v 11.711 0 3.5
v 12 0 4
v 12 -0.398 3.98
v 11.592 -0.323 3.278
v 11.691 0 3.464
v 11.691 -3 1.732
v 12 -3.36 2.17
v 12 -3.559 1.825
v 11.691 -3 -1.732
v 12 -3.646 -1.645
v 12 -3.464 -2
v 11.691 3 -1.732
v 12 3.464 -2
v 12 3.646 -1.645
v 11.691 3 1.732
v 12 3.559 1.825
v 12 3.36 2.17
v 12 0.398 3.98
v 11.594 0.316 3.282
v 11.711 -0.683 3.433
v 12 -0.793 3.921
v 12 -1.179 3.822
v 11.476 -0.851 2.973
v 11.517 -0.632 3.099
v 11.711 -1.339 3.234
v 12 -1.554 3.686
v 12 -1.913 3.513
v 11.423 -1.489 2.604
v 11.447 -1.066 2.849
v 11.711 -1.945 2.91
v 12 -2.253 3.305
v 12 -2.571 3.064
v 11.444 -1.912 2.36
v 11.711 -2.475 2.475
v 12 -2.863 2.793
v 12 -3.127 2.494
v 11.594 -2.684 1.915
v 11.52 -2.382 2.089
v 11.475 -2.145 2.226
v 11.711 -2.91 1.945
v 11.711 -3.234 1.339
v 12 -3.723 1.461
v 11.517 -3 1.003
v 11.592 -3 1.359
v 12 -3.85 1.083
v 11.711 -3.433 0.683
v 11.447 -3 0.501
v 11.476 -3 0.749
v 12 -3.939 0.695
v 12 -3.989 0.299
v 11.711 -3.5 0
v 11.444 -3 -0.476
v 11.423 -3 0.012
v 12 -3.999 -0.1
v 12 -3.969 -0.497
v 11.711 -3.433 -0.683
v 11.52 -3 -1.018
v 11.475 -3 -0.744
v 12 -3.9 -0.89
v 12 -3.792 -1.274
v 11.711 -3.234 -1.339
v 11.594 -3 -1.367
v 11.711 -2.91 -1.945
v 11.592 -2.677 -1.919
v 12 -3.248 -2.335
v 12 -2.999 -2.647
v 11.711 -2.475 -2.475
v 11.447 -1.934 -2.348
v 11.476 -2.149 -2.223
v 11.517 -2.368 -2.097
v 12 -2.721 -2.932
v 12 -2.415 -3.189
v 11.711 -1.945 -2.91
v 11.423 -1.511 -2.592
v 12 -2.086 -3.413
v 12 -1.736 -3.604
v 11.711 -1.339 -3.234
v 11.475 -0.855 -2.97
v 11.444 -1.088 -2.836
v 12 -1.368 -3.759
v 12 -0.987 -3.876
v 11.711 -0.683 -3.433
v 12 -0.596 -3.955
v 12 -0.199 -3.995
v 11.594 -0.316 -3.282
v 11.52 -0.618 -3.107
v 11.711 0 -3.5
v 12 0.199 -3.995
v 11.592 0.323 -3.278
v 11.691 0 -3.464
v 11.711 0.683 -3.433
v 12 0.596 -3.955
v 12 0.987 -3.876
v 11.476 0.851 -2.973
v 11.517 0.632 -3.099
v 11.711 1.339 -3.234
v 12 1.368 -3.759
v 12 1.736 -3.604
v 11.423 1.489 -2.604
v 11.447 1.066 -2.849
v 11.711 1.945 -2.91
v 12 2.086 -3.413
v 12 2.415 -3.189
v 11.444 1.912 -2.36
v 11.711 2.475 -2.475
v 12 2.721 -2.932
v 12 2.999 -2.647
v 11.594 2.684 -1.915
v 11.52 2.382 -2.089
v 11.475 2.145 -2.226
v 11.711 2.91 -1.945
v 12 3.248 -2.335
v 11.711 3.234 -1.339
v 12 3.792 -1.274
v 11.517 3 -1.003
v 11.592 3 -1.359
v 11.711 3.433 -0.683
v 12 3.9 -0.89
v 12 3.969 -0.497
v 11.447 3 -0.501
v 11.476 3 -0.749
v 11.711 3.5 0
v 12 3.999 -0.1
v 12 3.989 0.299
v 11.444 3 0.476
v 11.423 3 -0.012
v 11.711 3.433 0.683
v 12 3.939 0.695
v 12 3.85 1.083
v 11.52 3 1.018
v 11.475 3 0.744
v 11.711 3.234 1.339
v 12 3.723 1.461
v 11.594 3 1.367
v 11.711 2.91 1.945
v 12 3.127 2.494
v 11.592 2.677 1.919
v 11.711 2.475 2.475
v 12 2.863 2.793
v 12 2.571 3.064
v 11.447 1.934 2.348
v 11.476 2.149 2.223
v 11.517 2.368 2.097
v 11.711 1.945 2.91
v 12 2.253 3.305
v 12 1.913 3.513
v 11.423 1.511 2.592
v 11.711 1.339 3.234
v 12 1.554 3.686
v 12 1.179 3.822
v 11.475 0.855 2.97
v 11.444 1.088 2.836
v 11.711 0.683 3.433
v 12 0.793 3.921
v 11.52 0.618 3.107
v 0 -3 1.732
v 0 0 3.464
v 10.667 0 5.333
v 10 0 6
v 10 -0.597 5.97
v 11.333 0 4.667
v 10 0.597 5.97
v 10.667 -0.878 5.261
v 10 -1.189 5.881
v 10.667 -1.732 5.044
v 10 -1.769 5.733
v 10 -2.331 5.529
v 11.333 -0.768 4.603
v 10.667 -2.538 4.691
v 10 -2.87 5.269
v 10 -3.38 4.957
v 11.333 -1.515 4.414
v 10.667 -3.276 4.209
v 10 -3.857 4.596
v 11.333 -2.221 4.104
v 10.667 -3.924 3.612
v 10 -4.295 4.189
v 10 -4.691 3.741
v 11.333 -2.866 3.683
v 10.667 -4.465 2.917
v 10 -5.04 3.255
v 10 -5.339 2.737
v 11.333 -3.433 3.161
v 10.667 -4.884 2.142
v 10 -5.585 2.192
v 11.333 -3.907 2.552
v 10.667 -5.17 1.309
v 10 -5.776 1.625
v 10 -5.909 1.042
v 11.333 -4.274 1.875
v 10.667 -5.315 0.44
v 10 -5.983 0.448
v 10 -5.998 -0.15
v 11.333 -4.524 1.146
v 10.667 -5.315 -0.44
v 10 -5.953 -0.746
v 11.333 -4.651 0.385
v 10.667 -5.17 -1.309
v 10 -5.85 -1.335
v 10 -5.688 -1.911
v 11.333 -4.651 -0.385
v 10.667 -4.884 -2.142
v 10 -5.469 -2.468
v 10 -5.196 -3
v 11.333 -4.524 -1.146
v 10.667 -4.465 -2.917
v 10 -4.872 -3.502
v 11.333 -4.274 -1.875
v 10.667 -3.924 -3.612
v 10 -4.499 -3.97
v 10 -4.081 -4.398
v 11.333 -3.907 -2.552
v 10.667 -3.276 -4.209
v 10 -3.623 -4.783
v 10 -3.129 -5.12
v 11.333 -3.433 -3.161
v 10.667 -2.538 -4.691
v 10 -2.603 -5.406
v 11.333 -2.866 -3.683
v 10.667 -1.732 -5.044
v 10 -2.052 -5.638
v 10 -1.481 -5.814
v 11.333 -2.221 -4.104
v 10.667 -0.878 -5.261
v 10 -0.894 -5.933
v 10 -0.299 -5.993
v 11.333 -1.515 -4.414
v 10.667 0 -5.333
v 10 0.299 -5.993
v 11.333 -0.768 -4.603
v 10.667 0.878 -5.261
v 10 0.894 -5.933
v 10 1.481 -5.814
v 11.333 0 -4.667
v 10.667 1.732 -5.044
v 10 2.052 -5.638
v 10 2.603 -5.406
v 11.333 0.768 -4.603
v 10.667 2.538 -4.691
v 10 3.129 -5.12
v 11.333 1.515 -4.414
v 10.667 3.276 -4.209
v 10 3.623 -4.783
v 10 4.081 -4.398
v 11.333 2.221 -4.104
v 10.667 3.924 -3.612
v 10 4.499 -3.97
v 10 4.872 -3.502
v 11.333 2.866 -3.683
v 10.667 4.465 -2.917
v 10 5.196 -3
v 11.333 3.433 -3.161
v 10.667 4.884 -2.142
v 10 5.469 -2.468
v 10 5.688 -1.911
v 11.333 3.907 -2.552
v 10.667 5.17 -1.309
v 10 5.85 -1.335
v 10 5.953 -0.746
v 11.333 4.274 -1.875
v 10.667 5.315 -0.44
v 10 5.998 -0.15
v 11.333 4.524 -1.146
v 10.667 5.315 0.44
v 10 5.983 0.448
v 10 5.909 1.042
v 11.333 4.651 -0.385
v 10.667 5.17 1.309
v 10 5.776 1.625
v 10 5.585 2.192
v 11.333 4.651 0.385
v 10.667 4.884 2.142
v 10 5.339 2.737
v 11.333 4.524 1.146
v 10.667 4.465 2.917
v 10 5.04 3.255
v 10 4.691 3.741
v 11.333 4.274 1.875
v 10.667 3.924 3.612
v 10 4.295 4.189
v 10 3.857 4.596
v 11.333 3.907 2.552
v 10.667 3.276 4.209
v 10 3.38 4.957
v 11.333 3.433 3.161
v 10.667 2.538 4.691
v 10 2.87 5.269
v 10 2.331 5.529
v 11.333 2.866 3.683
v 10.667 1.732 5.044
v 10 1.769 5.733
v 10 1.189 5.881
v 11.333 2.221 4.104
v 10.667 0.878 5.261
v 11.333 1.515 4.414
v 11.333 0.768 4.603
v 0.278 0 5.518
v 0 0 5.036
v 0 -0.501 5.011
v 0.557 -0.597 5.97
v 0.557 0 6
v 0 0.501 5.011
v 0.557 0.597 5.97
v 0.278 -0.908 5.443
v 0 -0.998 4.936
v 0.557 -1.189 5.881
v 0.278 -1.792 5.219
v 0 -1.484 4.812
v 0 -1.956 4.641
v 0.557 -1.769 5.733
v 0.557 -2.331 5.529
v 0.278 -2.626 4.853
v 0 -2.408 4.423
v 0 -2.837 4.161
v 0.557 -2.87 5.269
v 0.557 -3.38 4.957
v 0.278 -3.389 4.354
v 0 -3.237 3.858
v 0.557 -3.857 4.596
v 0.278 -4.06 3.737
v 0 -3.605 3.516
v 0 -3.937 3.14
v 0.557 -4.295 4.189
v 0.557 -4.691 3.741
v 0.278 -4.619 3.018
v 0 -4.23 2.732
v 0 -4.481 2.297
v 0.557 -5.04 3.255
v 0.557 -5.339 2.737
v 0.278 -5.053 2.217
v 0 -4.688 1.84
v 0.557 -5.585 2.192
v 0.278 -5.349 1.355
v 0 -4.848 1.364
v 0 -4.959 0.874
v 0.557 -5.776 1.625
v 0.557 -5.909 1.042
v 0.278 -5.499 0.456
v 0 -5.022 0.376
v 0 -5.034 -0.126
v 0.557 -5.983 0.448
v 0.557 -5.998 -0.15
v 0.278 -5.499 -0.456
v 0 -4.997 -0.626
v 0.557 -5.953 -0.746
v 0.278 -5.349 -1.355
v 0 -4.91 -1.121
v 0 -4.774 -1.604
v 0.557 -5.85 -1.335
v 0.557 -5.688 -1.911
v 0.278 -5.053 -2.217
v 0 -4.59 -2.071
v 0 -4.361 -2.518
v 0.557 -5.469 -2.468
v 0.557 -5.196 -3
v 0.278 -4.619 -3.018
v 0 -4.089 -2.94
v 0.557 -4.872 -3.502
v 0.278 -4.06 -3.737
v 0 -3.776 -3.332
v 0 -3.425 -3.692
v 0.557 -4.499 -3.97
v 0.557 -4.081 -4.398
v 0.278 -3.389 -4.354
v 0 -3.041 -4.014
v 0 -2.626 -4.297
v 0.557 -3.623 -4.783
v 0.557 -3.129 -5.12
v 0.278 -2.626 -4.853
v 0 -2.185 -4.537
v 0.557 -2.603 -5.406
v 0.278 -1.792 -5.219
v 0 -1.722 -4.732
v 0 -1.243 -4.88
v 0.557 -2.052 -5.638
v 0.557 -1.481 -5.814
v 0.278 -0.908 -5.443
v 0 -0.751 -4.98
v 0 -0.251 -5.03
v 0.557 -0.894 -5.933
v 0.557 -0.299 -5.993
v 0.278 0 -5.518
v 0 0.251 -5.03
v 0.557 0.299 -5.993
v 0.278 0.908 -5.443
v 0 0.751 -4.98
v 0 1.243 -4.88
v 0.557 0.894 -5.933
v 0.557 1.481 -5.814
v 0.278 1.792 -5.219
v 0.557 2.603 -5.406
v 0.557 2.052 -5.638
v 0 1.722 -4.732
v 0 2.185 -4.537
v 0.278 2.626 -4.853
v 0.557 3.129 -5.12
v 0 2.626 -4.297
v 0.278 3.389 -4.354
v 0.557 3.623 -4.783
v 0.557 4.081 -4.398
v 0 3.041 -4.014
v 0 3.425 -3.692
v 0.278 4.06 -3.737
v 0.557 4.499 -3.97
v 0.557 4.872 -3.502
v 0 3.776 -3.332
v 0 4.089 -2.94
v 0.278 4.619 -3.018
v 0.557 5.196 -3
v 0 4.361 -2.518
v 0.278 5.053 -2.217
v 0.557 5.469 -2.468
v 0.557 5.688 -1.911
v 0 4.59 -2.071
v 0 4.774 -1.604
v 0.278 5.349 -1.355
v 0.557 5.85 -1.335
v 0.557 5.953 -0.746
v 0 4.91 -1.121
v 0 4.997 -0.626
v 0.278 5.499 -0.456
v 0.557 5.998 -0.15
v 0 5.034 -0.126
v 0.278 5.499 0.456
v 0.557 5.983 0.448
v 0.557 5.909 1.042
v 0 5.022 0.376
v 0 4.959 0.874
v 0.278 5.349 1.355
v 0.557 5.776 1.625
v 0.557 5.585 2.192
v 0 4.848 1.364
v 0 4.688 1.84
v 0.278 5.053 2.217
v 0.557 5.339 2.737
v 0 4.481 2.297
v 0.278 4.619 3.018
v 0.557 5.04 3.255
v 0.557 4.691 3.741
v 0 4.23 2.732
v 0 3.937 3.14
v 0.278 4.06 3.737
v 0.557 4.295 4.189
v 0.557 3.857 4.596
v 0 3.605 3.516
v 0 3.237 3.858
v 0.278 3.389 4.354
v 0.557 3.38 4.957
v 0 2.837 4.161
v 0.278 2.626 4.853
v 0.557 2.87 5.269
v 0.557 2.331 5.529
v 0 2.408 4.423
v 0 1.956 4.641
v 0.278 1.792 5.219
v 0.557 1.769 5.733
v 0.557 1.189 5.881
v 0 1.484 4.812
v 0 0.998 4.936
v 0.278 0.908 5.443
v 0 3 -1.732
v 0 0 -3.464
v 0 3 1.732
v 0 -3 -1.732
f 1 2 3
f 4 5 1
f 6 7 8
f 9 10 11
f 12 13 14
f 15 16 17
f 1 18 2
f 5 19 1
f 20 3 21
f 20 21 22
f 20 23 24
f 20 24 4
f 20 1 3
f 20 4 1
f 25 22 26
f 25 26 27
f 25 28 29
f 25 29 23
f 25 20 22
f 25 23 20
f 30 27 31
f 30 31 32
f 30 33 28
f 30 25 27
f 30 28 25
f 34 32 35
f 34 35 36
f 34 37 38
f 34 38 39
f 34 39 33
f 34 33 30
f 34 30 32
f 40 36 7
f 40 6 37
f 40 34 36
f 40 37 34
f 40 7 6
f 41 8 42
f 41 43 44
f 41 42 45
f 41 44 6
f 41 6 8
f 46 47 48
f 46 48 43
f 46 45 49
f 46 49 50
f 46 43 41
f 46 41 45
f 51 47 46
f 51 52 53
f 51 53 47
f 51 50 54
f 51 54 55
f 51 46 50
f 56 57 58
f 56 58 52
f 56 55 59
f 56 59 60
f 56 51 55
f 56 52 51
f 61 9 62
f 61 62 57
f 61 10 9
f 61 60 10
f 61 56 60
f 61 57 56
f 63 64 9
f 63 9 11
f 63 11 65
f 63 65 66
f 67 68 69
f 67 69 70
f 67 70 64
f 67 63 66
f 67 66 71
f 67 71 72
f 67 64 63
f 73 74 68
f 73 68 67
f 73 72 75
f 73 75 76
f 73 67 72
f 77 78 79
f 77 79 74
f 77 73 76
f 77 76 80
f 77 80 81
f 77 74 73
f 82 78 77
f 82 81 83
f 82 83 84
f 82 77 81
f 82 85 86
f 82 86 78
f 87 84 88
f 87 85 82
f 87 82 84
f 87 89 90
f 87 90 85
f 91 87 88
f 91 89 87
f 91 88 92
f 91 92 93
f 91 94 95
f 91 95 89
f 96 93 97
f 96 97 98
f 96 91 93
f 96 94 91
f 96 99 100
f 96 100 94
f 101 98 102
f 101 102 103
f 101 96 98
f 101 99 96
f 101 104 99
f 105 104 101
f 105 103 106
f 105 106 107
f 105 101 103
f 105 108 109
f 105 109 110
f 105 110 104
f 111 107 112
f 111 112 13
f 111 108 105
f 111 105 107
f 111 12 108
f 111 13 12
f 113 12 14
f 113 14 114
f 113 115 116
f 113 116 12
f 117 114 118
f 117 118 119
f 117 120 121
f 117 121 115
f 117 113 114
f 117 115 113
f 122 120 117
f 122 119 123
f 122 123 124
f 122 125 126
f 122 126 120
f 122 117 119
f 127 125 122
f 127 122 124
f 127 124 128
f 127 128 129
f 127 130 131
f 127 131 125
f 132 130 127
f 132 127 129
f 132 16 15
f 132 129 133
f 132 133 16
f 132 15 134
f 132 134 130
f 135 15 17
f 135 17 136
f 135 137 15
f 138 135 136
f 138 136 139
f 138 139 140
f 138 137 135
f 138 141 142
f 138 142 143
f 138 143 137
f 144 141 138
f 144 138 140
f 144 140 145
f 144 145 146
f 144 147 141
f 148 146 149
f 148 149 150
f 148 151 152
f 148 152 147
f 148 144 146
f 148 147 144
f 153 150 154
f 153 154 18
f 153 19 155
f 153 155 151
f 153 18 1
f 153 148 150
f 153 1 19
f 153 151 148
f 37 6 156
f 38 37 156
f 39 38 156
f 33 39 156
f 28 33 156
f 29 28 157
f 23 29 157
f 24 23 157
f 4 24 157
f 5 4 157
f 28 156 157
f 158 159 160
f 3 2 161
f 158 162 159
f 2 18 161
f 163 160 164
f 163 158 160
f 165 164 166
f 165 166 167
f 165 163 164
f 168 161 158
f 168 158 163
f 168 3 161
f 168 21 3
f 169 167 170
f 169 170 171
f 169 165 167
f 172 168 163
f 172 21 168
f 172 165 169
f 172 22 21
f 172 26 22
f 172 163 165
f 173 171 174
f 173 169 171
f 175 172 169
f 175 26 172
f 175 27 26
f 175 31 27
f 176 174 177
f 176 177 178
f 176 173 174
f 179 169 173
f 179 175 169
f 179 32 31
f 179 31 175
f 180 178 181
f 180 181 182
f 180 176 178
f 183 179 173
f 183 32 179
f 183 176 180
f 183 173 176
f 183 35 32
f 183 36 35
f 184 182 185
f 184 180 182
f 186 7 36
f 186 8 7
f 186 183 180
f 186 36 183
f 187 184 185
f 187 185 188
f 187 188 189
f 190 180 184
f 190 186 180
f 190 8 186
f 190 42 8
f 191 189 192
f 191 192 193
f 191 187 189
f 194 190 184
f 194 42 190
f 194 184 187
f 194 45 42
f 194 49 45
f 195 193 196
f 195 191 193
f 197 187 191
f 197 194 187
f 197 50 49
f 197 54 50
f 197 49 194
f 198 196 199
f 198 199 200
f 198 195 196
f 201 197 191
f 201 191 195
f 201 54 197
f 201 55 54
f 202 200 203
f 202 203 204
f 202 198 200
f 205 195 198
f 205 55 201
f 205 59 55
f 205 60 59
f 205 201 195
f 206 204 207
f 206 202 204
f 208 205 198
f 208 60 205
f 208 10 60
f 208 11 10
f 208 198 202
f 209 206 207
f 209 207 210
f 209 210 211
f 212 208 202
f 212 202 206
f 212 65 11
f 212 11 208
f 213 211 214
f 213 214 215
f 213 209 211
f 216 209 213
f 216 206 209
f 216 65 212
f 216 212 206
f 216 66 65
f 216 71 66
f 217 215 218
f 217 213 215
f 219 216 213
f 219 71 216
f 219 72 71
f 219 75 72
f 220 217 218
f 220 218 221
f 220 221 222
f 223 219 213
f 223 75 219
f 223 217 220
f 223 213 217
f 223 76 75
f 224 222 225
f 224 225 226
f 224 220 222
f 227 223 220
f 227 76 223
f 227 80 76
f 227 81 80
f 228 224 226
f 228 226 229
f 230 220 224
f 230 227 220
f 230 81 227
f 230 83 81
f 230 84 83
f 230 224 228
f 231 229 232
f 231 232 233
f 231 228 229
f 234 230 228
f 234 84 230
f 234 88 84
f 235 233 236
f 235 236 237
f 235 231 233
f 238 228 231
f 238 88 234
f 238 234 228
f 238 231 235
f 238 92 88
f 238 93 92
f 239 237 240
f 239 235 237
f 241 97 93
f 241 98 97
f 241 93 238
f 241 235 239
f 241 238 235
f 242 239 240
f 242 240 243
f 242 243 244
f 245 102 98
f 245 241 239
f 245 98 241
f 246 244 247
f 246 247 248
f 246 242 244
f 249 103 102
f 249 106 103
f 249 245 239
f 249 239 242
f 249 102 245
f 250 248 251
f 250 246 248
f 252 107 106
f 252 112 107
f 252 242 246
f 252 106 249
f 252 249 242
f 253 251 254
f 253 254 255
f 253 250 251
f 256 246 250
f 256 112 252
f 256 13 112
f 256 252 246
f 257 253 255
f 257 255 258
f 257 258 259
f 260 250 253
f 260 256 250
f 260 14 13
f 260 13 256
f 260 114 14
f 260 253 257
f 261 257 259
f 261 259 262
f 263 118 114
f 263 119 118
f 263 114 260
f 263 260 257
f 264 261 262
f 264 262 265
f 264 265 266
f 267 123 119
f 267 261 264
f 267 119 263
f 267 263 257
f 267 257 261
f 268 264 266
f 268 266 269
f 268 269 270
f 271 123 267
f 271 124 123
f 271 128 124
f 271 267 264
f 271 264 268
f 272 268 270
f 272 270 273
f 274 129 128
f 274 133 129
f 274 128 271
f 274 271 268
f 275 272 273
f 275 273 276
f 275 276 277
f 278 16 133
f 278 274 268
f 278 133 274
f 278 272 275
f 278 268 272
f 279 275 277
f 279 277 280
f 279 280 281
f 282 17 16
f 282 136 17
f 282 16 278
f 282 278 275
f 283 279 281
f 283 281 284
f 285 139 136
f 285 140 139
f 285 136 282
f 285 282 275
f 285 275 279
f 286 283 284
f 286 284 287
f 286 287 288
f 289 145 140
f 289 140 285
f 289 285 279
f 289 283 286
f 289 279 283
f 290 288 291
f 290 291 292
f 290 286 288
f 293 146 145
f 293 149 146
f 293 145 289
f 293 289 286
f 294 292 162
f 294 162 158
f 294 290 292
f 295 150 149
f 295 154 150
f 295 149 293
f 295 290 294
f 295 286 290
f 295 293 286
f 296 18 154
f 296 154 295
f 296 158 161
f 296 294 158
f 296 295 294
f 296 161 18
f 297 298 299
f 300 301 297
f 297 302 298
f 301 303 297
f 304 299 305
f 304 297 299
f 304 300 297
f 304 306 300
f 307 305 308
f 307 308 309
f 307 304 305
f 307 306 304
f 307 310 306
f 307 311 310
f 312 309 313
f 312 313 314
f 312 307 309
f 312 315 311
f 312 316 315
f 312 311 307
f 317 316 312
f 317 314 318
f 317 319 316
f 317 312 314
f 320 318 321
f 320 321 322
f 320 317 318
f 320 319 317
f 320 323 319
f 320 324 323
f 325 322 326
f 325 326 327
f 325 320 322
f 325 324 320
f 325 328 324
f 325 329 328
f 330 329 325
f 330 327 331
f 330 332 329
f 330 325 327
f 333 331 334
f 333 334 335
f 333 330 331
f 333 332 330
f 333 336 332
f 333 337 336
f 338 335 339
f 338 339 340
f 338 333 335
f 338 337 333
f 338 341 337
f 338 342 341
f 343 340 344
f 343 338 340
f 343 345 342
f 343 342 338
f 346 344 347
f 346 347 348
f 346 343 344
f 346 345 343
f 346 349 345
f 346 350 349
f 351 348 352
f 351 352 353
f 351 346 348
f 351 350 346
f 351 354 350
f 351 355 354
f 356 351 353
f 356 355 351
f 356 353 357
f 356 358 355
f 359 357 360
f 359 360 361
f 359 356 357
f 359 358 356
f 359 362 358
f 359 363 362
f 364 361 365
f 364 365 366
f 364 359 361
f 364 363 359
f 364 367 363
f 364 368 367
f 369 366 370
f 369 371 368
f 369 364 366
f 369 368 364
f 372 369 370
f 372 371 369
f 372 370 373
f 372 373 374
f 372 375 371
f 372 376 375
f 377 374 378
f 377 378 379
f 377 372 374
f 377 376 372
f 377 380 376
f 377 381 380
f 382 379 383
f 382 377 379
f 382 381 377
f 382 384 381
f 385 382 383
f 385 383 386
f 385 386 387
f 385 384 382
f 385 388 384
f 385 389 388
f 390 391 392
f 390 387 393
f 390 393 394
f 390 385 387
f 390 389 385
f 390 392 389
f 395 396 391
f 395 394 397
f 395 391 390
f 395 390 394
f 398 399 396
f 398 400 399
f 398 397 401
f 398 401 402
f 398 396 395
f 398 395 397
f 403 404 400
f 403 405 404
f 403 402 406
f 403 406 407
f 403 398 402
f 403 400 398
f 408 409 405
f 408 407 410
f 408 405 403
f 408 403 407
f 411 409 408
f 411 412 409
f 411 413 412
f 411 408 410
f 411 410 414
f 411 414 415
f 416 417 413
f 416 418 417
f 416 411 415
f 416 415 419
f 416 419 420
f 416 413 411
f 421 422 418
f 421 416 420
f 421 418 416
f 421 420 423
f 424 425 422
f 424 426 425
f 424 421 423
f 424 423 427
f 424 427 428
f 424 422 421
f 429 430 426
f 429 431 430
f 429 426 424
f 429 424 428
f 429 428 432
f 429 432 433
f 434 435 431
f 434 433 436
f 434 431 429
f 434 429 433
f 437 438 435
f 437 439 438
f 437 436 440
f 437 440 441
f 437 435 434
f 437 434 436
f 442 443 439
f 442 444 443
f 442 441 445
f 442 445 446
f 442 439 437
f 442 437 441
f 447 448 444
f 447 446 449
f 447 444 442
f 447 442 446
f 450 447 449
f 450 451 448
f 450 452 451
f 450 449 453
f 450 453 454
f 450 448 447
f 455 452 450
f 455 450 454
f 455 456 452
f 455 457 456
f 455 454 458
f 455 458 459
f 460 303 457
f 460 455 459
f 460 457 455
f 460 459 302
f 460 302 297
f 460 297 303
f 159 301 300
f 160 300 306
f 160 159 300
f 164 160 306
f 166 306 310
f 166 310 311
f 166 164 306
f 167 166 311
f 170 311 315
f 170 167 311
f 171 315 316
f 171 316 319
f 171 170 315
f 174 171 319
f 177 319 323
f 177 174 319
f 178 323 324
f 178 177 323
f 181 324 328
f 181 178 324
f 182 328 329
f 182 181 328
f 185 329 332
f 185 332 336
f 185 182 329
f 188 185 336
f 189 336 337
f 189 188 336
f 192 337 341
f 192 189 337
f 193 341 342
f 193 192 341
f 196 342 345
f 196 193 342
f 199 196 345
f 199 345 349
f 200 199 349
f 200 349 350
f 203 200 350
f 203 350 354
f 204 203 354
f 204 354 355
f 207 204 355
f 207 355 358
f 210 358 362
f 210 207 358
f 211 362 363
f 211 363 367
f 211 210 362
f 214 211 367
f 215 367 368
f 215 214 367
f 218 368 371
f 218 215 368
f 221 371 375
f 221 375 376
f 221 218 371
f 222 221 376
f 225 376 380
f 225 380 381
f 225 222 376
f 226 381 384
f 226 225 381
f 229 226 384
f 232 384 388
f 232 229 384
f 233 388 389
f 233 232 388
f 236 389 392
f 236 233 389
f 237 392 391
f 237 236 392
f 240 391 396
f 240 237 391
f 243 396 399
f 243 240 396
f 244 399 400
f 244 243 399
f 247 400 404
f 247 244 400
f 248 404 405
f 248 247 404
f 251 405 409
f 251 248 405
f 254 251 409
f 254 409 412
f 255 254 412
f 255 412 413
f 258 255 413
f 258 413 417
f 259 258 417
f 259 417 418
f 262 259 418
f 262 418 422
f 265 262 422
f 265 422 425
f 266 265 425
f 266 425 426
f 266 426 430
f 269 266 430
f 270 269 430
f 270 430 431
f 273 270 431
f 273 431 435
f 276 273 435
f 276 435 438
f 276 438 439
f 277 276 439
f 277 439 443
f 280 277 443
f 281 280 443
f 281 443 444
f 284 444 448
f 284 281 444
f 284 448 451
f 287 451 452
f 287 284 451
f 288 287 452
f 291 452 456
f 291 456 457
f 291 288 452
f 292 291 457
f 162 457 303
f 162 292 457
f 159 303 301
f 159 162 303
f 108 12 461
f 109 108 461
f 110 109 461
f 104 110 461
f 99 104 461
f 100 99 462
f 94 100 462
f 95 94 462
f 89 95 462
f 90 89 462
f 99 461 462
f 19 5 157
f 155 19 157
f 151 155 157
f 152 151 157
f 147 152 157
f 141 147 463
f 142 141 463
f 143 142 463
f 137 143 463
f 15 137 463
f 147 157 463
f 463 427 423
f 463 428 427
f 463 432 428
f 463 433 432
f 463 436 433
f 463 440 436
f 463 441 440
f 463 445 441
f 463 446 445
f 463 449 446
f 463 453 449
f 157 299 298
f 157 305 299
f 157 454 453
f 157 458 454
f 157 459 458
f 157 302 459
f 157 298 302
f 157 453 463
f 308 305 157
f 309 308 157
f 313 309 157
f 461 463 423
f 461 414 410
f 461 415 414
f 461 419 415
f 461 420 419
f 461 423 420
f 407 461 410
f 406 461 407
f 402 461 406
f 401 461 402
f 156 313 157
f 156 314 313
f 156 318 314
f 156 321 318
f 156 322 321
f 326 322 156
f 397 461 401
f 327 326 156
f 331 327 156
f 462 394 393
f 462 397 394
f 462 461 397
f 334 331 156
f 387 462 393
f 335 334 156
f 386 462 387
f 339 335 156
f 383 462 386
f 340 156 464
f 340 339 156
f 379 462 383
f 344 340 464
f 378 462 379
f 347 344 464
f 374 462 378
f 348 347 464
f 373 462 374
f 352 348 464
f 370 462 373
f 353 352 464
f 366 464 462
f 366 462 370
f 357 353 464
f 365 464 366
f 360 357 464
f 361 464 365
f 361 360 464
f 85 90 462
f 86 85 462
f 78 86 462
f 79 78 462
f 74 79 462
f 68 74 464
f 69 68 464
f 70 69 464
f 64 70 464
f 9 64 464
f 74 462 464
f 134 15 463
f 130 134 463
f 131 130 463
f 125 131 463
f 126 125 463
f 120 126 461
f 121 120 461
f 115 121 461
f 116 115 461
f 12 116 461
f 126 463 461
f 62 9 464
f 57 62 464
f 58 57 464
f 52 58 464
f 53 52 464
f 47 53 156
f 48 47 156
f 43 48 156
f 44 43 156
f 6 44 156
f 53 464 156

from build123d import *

# Parameters (mm, degrees)
HEX_2_DEPTH = 15.696938457


with BuildPart() as part:
    # BodySke → BaseBody (revolve)
    with BuildSketch(Plane.XY, mode=Mode.PRIVATE) as basebody_sk:
        Polygon((0, 0), (0, 5.036), (0.556565659, 6), (10, 6), (12, 4), (9.690598923, 0), align=None)
    revolve(basebody_sk.sketch.rotate(Axis((-12.7, 0, 0), (1, 0, 0)), 90), axis=Axis((-12.7, 0, 0), (1, 0, 0)))

    # Sketch2 → Hex 2 (cut, through all)
    with BuildSketch(Plane.ZY):
        Polygon((1.732050808, 3), (-1.732050808, 3), (-3.464101615, 0), (-1.732050808, -3), (1.732050808, -3), (3.464101615, 0), align=None)
    extrude(amount=-HEX_2_DEPTH, mode=Mode.SUBTRACT)


solid = part.part
